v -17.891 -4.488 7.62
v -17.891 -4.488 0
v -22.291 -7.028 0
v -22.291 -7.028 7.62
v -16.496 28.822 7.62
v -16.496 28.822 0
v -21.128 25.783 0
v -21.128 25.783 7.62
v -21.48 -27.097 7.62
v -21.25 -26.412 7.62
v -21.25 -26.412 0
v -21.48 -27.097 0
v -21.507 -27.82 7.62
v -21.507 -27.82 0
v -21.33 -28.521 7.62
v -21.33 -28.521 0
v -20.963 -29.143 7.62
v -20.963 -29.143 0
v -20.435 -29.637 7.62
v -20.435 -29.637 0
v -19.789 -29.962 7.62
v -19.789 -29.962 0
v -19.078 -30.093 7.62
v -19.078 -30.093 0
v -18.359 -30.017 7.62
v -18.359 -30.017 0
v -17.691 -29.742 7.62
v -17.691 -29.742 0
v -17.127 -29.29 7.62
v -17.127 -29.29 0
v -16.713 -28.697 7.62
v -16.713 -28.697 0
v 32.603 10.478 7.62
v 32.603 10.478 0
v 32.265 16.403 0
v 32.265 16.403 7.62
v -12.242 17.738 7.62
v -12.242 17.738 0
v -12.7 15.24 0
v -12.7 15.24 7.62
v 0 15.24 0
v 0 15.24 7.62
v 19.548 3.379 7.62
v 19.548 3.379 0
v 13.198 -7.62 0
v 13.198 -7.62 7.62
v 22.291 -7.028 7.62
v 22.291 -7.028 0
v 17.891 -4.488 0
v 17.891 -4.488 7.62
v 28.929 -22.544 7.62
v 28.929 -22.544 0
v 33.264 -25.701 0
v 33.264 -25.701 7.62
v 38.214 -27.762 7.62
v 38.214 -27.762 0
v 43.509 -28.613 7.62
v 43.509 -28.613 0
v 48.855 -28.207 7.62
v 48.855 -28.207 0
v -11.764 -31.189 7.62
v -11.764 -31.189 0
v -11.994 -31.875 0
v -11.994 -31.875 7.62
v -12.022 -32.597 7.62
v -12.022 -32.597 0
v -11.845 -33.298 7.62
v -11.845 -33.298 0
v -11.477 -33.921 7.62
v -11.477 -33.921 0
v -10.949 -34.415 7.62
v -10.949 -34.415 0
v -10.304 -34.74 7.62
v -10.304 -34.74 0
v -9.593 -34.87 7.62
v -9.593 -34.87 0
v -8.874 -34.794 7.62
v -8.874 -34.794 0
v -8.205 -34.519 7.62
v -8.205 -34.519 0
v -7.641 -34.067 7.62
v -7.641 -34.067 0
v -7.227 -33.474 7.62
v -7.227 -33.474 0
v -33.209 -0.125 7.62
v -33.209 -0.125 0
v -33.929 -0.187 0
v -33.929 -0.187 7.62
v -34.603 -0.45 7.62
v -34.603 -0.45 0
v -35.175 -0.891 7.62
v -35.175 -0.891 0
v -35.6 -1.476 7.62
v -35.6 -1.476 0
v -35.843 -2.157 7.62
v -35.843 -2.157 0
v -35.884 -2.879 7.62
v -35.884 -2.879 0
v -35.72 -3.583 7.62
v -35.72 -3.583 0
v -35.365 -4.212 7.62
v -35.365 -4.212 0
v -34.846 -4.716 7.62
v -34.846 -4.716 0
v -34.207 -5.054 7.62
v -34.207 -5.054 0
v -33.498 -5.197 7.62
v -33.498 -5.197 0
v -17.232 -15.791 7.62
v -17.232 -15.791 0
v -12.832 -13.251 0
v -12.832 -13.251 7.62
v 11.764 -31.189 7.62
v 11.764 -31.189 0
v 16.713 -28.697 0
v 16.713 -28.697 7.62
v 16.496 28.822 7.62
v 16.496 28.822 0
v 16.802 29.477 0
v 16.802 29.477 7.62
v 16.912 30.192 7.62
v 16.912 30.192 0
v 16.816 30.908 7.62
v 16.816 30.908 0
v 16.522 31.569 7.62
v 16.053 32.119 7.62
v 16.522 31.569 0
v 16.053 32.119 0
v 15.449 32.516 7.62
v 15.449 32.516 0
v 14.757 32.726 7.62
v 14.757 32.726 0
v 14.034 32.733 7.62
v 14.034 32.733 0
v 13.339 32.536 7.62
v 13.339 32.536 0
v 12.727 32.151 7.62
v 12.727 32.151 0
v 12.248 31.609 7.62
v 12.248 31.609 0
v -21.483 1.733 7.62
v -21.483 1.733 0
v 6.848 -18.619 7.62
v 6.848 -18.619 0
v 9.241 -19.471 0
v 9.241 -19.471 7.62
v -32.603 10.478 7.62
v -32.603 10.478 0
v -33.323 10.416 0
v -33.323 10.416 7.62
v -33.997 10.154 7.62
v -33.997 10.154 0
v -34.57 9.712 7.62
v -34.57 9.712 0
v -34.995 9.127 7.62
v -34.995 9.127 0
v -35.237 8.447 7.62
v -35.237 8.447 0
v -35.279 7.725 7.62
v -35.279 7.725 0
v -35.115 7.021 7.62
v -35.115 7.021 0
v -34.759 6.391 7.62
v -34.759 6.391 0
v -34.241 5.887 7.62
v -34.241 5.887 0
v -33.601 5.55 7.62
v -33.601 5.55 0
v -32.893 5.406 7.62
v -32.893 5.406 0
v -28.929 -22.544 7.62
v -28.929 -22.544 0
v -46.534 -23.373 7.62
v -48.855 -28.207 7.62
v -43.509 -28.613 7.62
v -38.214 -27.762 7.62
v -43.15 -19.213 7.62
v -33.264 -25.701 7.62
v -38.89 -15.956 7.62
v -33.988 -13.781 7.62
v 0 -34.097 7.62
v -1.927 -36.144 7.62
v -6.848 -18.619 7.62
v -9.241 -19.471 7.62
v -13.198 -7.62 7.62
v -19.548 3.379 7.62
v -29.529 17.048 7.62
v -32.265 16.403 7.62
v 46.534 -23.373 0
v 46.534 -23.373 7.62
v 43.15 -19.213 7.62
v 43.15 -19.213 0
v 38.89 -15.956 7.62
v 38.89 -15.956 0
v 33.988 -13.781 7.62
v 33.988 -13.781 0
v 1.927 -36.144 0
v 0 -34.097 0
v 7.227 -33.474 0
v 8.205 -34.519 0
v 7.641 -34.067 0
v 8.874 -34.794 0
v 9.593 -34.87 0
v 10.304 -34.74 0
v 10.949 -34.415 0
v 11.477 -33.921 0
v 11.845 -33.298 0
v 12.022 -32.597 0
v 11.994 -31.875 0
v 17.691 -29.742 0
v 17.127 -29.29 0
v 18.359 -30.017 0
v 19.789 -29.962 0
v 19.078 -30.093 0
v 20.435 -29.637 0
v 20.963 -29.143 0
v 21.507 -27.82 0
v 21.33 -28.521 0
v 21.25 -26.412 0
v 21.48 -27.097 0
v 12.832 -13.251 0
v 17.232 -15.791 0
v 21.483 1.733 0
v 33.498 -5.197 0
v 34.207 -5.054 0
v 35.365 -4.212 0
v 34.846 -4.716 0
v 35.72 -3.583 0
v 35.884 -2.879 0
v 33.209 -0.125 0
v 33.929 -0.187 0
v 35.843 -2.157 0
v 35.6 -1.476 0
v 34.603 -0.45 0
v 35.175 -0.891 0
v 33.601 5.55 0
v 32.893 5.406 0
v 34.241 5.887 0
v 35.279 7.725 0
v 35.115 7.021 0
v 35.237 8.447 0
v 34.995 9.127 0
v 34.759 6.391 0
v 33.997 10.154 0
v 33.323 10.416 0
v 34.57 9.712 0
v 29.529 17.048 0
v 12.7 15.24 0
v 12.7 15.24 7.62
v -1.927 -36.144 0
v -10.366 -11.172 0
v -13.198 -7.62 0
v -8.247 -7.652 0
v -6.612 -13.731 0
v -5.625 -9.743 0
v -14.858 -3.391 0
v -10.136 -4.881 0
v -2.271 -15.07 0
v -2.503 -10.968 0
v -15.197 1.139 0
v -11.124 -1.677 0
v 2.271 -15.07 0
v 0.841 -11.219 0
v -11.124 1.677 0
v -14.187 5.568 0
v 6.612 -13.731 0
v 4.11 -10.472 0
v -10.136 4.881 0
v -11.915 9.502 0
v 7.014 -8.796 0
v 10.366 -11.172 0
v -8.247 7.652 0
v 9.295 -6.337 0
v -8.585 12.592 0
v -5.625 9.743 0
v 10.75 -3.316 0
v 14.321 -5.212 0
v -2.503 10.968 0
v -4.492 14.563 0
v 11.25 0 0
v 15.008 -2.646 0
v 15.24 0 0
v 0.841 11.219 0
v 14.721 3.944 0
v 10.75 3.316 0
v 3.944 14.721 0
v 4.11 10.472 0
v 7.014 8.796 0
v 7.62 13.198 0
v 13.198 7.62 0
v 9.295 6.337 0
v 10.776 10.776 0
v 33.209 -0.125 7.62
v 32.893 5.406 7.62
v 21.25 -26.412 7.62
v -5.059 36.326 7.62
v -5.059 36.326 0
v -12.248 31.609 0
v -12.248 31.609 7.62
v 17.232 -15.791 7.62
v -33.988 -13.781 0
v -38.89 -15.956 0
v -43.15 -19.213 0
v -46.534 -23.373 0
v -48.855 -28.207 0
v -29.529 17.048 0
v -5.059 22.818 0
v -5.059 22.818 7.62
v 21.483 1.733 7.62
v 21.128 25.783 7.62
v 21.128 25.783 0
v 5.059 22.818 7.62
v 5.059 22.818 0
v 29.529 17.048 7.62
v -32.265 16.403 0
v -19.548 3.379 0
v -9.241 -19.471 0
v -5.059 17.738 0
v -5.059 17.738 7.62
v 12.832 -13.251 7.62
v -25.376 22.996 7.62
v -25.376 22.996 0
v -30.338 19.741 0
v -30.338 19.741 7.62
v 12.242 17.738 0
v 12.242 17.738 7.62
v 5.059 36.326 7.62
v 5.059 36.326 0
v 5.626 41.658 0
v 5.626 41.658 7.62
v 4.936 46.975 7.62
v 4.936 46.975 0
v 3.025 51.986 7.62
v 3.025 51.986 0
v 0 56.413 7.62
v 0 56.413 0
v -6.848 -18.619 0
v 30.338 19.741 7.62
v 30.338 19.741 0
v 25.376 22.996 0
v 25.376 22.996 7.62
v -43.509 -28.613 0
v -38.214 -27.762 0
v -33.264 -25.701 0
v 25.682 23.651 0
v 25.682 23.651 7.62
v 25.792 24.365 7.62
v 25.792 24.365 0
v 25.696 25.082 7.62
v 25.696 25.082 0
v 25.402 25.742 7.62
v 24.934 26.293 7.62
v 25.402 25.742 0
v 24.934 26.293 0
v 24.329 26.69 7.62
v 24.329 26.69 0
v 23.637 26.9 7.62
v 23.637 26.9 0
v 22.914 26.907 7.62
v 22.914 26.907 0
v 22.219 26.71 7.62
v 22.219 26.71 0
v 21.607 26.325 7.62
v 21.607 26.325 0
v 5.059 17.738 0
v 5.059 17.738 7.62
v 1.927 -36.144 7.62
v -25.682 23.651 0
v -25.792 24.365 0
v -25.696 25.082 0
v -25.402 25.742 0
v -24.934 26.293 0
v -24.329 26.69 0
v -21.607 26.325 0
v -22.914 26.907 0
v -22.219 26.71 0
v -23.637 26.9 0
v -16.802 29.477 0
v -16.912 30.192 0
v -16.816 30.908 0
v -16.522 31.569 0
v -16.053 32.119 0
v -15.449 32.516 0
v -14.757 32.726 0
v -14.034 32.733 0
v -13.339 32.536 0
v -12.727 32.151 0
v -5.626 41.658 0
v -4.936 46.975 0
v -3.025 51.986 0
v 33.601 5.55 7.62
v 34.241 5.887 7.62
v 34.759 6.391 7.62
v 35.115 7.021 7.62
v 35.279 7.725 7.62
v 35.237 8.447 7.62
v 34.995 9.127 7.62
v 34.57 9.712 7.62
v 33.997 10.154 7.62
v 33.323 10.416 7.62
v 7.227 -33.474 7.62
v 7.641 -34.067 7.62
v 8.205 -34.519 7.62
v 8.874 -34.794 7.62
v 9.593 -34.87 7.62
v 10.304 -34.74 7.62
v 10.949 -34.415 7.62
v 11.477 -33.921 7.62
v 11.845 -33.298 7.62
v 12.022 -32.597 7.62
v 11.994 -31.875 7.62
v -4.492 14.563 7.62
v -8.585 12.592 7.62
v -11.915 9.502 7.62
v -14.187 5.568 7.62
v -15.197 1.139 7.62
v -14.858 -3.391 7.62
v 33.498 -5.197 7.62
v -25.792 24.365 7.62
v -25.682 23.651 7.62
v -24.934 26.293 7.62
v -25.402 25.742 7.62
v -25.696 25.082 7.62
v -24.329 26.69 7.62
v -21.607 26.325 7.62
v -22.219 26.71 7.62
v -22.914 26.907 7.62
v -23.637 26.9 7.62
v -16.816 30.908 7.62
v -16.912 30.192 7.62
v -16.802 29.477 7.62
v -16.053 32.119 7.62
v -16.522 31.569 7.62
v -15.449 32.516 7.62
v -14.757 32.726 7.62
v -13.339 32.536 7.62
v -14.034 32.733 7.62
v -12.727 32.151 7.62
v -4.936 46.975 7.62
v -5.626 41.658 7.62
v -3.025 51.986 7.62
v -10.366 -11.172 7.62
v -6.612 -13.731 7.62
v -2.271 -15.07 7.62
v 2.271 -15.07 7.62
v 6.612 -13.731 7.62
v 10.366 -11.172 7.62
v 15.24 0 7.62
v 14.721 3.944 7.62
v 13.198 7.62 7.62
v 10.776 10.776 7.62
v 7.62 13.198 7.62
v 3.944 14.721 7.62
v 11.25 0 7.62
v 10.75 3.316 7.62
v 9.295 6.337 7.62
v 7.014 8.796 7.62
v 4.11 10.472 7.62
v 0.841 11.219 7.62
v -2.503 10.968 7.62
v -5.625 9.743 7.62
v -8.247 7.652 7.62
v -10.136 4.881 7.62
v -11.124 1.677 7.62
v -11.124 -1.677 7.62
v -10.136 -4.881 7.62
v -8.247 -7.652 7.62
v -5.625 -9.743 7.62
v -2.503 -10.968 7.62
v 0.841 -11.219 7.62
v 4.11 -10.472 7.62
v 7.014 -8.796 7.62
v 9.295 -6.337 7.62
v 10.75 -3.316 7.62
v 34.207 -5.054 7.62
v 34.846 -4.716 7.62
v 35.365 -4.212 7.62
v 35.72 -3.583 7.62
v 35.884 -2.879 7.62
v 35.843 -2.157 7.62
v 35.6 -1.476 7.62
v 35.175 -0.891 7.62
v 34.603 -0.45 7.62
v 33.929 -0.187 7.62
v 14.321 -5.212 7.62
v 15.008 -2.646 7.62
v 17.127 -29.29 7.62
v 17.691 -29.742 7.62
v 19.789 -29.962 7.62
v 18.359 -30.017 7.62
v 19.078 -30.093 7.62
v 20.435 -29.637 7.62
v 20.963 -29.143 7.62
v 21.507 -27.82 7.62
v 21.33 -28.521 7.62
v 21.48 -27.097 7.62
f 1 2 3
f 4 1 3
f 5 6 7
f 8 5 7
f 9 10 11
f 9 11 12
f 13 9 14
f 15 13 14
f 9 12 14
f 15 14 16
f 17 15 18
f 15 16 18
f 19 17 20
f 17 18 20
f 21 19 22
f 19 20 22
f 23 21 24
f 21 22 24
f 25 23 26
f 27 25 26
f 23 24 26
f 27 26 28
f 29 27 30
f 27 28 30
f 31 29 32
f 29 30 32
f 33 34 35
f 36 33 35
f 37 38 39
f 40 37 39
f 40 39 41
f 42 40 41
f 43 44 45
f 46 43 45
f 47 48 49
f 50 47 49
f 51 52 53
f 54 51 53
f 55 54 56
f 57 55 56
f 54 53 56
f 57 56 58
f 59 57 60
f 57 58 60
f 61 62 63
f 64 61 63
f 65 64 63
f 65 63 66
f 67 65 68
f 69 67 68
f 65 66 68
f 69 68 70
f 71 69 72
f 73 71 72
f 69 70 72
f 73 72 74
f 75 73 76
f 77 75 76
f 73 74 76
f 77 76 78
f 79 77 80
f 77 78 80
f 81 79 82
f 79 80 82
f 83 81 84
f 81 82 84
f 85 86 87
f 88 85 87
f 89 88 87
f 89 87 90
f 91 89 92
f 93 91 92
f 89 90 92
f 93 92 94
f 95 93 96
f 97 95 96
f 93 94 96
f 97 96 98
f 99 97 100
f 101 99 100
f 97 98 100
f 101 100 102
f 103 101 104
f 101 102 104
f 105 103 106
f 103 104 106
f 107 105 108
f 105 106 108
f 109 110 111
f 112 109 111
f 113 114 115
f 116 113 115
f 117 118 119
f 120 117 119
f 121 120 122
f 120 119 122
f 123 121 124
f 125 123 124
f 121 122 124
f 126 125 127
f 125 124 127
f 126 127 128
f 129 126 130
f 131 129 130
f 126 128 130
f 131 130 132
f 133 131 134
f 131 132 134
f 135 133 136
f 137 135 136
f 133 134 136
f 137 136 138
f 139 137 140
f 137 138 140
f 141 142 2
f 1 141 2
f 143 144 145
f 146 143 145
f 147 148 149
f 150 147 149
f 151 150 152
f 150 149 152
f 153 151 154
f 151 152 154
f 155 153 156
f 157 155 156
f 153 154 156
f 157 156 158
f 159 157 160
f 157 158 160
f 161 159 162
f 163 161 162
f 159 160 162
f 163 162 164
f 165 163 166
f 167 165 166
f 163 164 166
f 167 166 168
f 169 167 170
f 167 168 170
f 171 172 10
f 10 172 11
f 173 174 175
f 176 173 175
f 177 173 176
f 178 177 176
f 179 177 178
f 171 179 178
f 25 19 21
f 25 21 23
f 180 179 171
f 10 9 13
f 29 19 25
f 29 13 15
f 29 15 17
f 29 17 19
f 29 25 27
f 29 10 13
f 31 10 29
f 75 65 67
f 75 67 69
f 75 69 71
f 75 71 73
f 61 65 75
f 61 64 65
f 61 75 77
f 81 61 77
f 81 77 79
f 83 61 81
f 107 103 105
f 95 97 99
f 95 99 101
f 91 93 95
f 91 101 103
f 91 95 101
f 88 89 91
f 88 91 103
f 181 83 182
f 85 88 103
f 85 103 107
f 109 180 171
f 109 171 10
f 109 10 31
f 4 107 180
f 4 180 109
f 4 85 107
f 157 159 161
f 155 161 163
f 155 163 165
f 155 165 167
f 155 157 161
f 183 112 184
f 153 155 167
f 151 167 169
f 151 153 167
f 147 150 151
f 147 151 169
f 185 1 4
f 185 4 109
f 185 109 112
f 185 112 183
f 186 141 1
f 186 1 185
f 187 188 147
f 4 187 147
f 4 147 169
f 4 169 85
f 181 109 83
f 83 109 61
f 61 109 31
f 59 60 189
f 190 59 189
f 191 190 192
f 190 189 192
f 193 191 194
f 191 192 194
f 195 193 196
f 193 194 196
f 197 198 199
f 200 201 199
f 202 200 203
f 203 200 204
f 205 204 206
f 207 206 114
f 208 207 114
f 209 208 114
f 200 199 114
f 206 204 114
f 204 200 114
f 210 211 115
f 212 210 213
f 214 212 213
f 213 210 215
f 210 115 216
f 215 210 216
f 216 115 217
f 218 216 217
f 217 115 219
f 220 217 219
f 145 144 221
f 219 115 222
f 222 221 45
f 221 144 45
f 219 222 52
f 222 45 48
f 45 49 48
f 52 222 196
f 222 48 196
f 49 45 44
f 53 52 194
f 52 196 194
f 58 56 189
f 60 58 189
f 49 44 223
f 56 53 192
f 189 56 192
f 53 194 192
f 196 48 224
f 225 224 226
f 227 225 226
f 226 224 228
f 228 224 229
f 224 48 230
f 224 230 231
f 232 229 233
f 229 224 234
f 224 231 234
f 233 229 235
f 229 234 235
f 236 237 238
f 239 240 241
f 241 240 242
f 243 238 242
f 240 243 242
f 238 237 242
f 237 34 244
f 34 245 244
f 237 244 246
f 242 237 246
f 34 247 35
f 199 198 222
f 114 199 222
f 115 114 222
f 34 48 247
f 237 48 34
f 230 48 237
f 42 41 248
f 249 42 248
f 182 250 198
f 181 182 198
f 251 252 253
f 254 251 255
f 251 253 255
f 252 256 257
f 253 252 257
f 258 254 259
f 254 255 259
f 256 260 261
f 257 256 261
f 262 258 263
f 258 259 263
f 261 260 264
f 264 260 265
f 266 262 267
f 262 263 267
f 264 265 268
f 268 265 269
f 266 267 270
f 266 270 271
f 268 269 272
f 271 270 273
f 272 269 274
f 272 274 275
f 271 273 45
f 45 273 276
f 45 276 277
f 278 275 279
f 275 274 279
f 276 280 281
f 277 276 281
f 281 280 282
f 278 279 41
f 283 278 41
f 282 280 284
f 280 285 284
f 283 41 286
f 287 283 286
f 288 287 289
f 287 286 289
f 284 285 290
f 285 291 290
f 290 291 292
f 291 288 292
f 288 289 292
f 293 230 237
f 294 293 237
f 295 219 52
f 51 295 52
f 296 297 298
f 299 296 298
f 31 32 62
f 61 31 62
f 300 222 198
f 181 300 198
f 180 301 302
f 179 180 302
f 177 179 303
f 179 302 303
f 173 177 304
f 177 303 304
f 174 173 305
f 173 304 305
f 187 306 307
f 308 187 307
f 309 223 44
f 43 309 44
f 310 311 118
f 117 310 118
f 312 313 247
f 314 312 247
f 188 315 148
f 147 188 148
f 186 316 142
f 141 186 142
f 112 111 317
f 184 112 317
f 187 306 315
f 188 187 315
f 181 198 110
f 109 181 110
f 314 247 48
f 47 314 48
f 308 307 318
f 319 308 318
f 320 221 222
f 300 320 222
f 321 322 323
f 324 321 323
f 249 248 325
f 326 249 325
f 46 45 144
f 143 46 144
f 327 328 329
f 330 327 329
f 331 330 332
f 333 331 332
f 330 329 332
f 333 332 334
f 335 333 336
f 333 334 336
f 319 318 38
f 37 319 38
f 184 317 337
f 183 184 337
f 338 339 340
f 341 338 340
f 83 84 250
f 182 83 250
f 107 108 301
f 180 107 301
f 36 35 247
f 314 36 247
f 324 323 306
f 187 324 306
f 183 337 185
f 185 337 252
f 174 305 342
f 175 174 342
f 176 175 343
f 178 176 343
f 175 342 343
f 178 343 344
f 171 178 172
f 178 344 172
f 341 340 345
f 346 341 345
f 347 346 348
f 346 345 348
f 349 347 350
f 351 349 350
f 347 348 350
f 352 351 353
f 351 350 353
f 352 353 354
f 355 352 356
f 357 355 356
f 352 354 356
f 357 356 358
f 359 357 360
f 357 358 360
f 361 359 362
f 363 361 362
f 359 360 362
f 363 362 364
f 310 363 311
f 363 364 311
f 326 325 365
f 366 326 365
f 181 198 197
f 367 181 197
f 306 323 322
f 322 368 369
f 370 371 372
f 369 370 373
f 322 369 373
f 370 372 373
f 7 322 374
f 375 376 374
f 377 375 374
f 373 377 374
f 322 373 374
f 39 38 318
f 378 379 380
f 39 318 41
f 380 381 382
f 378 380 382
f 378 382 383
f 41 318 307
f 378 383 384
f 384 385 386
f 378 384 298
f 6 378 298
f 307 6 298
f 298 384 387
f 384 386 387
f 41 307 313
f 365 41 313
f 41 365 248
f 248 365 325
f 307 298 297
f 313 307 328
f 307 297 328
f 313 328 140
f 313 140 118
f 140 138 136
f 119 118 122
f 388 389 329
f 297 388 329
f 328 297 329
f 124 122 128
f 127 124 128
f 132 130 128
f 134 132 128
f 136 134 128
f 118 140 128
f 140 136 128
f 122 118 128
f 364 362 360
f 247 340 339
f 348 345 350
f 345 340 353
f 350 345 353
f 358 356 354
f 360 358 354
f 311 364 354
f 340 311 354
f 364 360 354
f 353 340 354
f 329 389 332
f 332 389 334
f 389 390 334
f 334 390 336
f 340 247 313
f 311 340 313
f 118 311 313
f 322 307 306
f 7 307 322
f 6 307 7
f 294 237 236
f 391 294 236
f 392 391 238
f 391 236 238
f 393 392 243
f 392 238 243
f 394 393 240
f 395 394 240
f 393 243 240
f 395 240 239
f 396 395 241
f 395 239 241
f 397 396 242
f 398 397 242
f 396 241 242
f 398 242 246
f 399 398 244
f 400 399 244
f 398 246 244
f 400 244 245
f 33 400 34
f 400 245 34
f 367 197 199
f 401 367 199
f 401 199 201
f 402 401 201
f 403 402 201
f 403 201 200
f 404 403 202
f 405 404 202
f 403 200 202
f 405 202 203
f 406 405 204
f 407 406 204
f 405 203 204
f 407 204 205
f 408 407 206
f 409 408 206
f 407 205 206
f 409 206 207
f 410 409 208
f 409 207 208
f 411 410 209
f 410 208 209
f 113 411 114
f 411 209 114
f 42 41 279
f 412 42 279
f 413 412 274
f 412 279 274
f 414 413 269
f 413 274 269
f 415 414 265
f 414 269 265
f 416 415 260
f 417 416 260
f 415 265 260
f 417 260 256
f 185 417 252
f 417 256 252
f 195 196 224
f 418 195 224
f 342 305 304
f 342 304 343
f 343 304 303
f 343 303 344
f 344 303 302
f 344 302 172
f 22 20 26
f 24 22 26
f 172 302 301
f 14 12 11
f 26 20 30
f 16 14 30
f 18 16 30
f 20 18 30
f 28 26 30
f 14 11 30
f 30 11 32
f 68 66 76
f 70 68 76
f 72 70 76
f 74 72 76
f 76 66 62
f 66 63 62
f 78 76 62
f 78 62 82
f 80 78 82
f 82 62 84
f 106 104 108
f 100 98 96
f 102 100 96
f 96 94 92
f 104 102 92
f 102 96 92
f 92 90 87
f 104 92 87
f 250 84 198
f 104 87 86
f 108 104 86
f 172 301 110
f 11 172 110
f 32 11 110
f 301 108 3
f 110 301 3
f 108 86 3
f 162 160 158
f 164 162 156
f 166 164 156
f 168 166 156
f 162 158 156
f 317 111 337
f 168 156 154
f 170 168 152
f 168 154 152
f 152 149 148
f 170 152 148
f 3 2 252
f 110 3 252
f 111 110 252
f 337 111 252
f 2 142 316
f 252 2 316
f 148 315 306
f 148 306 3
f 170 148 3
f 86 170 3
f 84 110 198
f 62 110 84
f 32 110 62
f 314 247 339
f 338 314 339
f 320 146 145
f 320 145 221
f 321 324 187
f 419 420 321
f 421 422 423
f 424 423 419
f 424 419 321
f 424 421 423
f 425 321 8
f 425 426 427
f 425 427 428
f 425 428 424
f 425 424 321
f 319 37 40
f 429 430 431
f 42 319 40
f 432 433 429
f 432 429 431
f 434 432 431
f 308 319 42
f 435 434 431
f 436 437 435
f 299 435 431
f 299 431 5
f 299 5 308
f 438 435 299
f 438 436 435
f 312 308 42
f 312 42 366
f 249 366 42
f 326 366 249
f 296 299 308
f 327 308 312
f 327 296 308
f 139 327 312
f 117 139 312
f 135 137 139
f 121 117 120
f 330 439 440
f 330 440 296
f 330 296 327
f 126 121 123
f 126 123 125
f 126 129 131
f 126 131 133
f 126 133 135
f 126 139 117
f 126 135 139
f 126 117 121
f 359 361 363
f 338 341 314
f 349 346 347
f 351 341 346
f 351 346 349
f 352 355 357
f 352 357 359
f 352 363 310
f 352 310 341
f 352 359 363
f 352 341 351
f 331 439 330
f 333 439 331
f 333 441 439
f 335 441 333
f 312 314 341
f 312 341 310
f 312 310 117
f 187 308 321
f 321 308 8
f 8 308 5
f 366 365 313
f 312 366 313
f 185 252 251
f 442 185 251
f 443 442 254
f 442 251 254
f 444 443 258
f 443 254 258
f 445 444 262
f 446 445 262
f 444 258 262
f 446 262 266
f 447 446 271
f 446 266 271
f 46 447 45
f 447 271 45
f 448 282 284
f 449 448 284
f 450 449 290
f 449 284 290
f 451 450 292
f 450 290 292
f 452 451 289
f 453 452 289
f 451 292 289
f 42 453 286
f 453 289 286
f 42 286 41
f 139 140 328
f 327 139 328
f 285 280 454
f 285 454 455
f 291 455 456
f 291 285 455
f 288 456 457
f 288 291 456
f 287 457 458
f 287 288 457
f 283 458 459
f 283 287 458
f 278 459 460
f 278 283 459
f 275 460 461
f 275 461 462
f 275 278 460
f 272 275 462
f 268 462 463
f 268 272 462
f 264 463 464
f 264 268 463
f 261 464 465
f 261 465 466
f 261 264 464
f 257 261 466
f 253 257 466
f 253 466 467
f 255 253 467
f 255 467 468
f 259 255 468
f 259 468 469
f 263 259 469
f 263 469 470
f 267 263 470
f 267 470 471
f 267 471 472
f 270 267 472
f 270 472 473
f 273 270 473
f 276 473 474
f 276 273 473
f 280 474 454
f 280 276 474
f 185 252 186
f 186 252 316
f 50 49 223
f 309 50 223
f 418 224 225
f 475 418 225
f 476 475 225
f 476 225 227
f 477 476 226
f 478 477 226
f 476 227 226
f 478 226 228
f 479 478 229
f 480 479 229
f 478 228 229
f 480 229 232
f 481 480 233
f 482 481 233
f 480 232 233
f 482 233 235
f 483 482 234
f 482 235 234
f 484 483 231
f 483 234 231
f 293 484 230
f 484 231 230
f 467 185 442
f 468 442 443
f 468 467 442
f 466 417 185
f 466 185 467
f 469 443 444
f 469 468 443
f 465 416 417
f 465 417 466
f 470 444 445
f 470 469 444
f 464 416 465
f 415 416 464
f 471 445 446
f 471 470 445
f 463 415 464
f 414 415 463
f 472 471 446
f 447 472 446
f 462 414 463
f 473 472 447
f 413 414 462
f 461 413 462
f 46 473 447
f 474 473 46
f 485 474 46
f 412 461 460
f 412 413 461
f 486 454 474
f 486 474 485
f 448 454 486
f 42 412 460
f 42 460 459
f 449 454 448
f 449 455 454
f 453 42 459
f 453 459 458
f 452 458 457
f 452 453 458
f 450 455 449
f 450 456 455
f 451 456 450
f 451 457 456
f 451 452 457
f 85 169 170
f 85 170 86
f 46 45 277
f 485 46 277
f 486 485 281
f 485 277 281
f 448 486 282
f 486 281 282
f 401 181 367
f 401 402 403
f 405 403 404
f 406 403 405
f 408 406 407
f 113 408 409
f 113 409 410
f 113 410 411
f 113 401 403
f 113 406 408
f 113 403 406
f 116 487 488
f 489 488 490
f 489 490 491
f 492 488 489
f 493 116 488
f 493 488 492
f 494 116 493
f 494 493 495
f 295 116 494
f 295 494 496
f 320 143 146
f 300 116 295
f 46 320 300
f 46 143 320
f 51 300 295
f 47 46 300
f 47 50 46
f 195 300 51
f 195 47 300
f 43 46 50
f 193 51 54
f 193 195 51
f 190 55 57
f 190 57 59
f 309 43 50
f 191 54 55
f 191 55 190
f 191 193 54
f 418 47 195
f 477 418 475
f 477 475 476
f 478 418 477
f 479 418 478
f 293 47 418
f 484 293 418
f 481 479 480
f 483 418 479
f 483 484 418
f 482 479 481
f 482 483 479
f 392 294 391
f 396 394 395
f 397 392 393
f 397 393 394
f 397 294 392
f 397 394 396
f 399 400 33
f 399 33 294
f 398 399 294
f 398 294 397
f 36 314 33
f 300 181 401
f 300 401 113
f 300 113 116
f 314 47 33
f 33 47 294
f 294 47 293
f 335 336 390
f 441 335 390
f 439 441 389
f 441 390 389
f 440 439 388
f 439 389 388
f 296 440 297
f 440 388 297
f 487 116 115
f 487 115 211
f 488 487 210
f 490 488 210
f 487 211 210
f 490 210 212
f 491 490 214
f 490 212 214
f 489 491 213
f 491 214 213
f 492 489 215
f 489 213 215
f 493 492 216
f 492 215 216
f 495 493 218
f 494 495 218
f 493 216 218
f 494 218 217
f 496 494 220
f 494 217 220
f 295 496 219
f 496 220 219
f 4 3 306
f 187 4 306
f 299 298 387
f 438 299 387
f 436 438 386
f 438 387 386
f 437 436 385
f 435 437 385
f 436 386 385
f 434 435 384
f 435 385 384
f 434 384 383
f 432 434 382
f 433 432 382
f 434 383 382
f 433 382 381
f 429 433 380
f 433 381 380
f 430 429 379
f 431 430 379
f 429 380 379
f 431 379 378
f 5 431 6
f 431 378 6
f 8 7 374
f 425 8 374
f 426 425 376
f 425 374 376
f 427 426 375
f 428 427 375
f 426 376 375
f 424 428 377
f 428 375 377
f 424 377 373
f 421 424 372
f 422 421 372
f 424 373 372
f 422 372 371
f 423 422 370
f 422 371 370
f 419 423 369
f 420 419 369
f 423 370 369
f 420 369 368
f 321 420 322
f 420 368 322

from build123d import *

# Parameters (mm, degrees)
F0_R     = 11.25
F1_DEPTH = 7.62


with BuildPart() as f1:
    # F0 (on Top) → F1 (new body)
    with BuildSketch(Plane.XY):
        with BuildLine():
            ThreePointArc((13.198227, -7.62), (14.72071, -3.944402), (15.24, 0))
            ThreePointArc((15.24, 0), (10.776307, 10.776307), (0, 15.24))
            ThreePointArc((0, 15.24), (-13.198227, 7.62), (-13.198227, -7.62))
            ThreePointArc((-13.198227, -7.62), (0, -15.24), (13.198227, -7.62))
        make_face()
        Circle(F0_R, mode=Mode.SUBTRACT)
        with BuildLine():
            Line((19.548227, 3.378523), (13.198227, -7.62))
            Line((13.198227, -7.62), (6.848227, -18.618523))
            Line((6.848227, -18.618523), (9.240887, -19.471035))
            Line((9.240887, -19.471035), (12.832269, -13.250579))
            Line((12.832269, -13.250579), (17.231679, -15.790579))
            Line((17.231679, -15.790579), (0, -34.096789))
            Line((0, -34.096789), (1.926831, -36.143774))
            Line((1.926831, -36.143774), (7.227219, -33.47426))
            Line((7.227219, -33.47426), (11.764275, -31.189194))
            Line((11.764275, -31.189194), (16.712822, -28.696884))
            Line((16.712822, -28.696884), (21.249878, -26.411818))
            Line((21.249878, -26.411818), (28.929219, -22.544157))
            ThreePointArc((28.929219, -22.544157), (38.214118, -27.762026), (48.855442, -28.206702))
            ThreePointArc((48.855442, -28.206702), (43.149679, -19.213384), (33.988422, -13.78136))
            Line((33.988422, -13.78136), (33.498245, -5.197025))
            Line((33.498245, -5.197025), (33.208641, -0.125287))
            Line((33.208641, -0.125287), (32.892772, 5.406436))
            Line((32.892772, 5.406436), (32.603169, 10.478174))
            Line((32.603169, 10.478174), (32.264842, 16.403202))
            Line((32.264842, 16.403202), (29.528686, 17.048395))
            Line((29.528686, 17.048395), (22.290881, -7.027782))
            Line((22.290881, -7.027782), (17.891472, -4.487782))
            Line((17.891472, -4.487782), (21.482855, 1.732674))
            Line((21.482855, 1.732674), (19.548227, 3.378523))
        make_face()
        with BuildLine():
            Line((-12.7, 15.24), (0, 15.24))
            Line((0, 15.24), (12.7, 15.24))
            Line((12.7, 15.24), (12.241967, 17.738361))
            Line((12.241967, 17.738361), (5.059203, 17.738361))
            Line((5.059203, 17.738361), (5.059203, 22.818361))
            Line((5.059203, 22.818361), (29.528686, 17.048395))
            Line((29.528686, 17.048395), (30.338011, 19.740572))
            Line((30.338011, 19.740572), (25.37595, 22.996085))
            Line((25.37595, 22.996085), (21.128497, 25.782758))
            Line((21.128497, 25.782758), (16.495819, 28.82217))
            Line((16.495819, 28.82217), (12.248366, 31.608843))
            Line((12.248366, 31.608843), (5.059203, 36.325517))
            ThreePointArc((5.059203, 36.325517), (4.935561, 46.97541), (0, 56.413405))
            ThreePointArc((0, 56.413405), (-4.935561, 46.97541), (-5.059203, 36.325517))
            Line((-5.059203, 36.325517), (-12.248366, 31.608843))
            Line((-12.248366, 31.608843), (-16.495819, 28.82217))
            Line((-16.495819, 28.82217), (-21.128497, 25.782758))
            Line((-21.128497, 25.782758), (-25.37595, 22.996085))
            Line((-25.37595, 22.996085), (-30.338011, 19.740572))
            Line((-30.338011, 19.740572), (-29.528686, 17.048395))
            Line((-29.528686, 17.048395), (-5.059203, 22.818361))
            Line((-5.059203, 22.818361), (-5.059203, 17.738361))
            Line((-5.059203, 17.738361), (-12.241967, 17.738361))
            Line((-12.241967, 17.738361), (-12.7, 15.24))
        make_face()
        with BuildLine():
            Line((-6.848227, -18.618523), (-13.198227, -7.62))
            Line((-13.198227, -7.62), (-19.548227, 3.378523))
            Line((-19.548227, 3.378523), (-21.482855, 1.732674))
            Line((-21.482855, 1.732674), (-17.891472, -4.487782))
            Line((-17.891472, -4.487782), (-22.290881, -7.027782))
            Line((-22.290881, -7.027782), (-29.528686, 17.048395))
            Line((-29.528686, 17.048395), (-32.264842, 16.403202))
            Line((-32.264842, 16.403202), (-32.603169, 10.478174))
            Line((-32.603169, 10.478174), (-32.892772, 5.406436))
            Line((-32.892772, 5.406436), (-33.208641, -0.125287))
            Line((-33.208641, -0.125287), (-33.498245, -5.197025))
            Line((-33.498245, -5.197025), (-33.988422, -13.78136))
            ThreePointArc((-33.988422, -13.78136), (-43.149679, -19.213384), (-48.855442, -28.206702))
            ThreePointArc((-48.855442, -28.206702), (-38.214118, -27.762026), (-28.929219, -22.544157))
            Line((-28.929219, -22.544157), (-21.249878, -26.411818))
            Line((-21.249878, -26.411818), (-16.712822, -28.696884))
            Line((-16.712822, -28.696884), (-11.764275, -31.189194))
            Line((-11.764275, -31.189194), (-7.227219, -33.47426))
            Line((-7.227219, -33.47426), (-1.926831, -36.143774))
            Line((-1.926831, -36.143774), (0, -34.096789))
            Line((0, -34.096789), (-17.231679, -15.790579))
            Line((-17.231679, -15.790579), (-12.832269, -13.250579))
            Line((-12.832269, -13.250579), (-9.240887, -19.471035))
            Line((-9.240887, -19.471035), (-6.848227, -18.618523))
        make_face()
        with BuildLine():
            Line((-33.498245, -5.197025), (-33.208641, -0.125287))
            ThreePointArc((-33.208641, -0.125287), (-35.889312, -2.516354), (-33.498245, -5.197025))
        make_face()
        with BuildLine():
            Line((-32.892772, 5.406436), (-32.603169, 10.478174))
            ThreePointArc((-32.603169, 10.478174), (-35.28384, 8.087107), (-32.892772, 5.406436))
        make_face()
        with BuildLine():
            ThreePointArc((-21.128497, 25.782758), (-24.64556, 26.513148), (-25.37595, 22.996085))
            Line((-25.37595, 22.996085), (-21.128497, 25.782758))
        make_face()
        with BuildLine():
            ThreePointArc((-12.248366, 31.608843), (-15.765429, 32.339233), (-16.495819, 28.82217))
            Line((-16.495819, 28.82217), (-12.248366, 31.608843))
        make_face()
        with BuildLine():
            Line((12.248366, 31.608843), (16.495819, 28.82217))
            ThreePointArc((16.495819, 28.82217), (15.765429, 32.339233), (12.248366, 31.608843))
        make_face()
        with BuildLine():
            Line((21.128497, 25.782758), (25.37595, 22.996085))
            ThreePointArc((25.37595, 22.996085), (24.64556, 26.513148), (21.128497, 25.782758))
        make_face()
        with BuildLine():
            ThreePointArc((32.892772, 5.406436), (35.28384, 8.087107), (32.603169, 10.478174))
            Line((32.603169, 10.478174), (32.892772, 5.406436))
        make_face()
        with BuildLine():
            ThreePointArc((33.498245, -5.197025), (35.889312, -2.516354), (33.208641, -0.125287))
            Line((33.208641, -0.125287), (33.498245, -5.197025))
        make_face()
        with BuildLine():
            Line((11.764275, -31.189194), (7.227219, -33.47426))
            ThreePointArc((7.227219, -33.47426), (10.63828, -34.600255), (11.764275, -31.189194))
        make_face()
        with BuildLine():
            Line((21.249878, -26.411818), (16.712822, -28.696884))
            ThreePointArc((16.712822, -28.696884), (20.123883, -29.822879), (21.249878, -26.411818))
        make_face()
        with BuildLine():
            ThreePointArc((-21.249878, -26.411818), (-20.123883, -29.822879), (-16.712822, -28.696884))
            Line((-16.712822, -28.696884), (-21.249878, -26.411818))
        make_face()
        with BuildLine():
            ThreePointArc((-11.764275, -31.189194), (-10.63828, -34.600255), (-7.227219, -33.47426))
            Line((-7.227219, -33.47426), (-11.764275, -31.189194))
        make_face()
    extrude(amount=F1_DEPTH)


solid = f1.part
